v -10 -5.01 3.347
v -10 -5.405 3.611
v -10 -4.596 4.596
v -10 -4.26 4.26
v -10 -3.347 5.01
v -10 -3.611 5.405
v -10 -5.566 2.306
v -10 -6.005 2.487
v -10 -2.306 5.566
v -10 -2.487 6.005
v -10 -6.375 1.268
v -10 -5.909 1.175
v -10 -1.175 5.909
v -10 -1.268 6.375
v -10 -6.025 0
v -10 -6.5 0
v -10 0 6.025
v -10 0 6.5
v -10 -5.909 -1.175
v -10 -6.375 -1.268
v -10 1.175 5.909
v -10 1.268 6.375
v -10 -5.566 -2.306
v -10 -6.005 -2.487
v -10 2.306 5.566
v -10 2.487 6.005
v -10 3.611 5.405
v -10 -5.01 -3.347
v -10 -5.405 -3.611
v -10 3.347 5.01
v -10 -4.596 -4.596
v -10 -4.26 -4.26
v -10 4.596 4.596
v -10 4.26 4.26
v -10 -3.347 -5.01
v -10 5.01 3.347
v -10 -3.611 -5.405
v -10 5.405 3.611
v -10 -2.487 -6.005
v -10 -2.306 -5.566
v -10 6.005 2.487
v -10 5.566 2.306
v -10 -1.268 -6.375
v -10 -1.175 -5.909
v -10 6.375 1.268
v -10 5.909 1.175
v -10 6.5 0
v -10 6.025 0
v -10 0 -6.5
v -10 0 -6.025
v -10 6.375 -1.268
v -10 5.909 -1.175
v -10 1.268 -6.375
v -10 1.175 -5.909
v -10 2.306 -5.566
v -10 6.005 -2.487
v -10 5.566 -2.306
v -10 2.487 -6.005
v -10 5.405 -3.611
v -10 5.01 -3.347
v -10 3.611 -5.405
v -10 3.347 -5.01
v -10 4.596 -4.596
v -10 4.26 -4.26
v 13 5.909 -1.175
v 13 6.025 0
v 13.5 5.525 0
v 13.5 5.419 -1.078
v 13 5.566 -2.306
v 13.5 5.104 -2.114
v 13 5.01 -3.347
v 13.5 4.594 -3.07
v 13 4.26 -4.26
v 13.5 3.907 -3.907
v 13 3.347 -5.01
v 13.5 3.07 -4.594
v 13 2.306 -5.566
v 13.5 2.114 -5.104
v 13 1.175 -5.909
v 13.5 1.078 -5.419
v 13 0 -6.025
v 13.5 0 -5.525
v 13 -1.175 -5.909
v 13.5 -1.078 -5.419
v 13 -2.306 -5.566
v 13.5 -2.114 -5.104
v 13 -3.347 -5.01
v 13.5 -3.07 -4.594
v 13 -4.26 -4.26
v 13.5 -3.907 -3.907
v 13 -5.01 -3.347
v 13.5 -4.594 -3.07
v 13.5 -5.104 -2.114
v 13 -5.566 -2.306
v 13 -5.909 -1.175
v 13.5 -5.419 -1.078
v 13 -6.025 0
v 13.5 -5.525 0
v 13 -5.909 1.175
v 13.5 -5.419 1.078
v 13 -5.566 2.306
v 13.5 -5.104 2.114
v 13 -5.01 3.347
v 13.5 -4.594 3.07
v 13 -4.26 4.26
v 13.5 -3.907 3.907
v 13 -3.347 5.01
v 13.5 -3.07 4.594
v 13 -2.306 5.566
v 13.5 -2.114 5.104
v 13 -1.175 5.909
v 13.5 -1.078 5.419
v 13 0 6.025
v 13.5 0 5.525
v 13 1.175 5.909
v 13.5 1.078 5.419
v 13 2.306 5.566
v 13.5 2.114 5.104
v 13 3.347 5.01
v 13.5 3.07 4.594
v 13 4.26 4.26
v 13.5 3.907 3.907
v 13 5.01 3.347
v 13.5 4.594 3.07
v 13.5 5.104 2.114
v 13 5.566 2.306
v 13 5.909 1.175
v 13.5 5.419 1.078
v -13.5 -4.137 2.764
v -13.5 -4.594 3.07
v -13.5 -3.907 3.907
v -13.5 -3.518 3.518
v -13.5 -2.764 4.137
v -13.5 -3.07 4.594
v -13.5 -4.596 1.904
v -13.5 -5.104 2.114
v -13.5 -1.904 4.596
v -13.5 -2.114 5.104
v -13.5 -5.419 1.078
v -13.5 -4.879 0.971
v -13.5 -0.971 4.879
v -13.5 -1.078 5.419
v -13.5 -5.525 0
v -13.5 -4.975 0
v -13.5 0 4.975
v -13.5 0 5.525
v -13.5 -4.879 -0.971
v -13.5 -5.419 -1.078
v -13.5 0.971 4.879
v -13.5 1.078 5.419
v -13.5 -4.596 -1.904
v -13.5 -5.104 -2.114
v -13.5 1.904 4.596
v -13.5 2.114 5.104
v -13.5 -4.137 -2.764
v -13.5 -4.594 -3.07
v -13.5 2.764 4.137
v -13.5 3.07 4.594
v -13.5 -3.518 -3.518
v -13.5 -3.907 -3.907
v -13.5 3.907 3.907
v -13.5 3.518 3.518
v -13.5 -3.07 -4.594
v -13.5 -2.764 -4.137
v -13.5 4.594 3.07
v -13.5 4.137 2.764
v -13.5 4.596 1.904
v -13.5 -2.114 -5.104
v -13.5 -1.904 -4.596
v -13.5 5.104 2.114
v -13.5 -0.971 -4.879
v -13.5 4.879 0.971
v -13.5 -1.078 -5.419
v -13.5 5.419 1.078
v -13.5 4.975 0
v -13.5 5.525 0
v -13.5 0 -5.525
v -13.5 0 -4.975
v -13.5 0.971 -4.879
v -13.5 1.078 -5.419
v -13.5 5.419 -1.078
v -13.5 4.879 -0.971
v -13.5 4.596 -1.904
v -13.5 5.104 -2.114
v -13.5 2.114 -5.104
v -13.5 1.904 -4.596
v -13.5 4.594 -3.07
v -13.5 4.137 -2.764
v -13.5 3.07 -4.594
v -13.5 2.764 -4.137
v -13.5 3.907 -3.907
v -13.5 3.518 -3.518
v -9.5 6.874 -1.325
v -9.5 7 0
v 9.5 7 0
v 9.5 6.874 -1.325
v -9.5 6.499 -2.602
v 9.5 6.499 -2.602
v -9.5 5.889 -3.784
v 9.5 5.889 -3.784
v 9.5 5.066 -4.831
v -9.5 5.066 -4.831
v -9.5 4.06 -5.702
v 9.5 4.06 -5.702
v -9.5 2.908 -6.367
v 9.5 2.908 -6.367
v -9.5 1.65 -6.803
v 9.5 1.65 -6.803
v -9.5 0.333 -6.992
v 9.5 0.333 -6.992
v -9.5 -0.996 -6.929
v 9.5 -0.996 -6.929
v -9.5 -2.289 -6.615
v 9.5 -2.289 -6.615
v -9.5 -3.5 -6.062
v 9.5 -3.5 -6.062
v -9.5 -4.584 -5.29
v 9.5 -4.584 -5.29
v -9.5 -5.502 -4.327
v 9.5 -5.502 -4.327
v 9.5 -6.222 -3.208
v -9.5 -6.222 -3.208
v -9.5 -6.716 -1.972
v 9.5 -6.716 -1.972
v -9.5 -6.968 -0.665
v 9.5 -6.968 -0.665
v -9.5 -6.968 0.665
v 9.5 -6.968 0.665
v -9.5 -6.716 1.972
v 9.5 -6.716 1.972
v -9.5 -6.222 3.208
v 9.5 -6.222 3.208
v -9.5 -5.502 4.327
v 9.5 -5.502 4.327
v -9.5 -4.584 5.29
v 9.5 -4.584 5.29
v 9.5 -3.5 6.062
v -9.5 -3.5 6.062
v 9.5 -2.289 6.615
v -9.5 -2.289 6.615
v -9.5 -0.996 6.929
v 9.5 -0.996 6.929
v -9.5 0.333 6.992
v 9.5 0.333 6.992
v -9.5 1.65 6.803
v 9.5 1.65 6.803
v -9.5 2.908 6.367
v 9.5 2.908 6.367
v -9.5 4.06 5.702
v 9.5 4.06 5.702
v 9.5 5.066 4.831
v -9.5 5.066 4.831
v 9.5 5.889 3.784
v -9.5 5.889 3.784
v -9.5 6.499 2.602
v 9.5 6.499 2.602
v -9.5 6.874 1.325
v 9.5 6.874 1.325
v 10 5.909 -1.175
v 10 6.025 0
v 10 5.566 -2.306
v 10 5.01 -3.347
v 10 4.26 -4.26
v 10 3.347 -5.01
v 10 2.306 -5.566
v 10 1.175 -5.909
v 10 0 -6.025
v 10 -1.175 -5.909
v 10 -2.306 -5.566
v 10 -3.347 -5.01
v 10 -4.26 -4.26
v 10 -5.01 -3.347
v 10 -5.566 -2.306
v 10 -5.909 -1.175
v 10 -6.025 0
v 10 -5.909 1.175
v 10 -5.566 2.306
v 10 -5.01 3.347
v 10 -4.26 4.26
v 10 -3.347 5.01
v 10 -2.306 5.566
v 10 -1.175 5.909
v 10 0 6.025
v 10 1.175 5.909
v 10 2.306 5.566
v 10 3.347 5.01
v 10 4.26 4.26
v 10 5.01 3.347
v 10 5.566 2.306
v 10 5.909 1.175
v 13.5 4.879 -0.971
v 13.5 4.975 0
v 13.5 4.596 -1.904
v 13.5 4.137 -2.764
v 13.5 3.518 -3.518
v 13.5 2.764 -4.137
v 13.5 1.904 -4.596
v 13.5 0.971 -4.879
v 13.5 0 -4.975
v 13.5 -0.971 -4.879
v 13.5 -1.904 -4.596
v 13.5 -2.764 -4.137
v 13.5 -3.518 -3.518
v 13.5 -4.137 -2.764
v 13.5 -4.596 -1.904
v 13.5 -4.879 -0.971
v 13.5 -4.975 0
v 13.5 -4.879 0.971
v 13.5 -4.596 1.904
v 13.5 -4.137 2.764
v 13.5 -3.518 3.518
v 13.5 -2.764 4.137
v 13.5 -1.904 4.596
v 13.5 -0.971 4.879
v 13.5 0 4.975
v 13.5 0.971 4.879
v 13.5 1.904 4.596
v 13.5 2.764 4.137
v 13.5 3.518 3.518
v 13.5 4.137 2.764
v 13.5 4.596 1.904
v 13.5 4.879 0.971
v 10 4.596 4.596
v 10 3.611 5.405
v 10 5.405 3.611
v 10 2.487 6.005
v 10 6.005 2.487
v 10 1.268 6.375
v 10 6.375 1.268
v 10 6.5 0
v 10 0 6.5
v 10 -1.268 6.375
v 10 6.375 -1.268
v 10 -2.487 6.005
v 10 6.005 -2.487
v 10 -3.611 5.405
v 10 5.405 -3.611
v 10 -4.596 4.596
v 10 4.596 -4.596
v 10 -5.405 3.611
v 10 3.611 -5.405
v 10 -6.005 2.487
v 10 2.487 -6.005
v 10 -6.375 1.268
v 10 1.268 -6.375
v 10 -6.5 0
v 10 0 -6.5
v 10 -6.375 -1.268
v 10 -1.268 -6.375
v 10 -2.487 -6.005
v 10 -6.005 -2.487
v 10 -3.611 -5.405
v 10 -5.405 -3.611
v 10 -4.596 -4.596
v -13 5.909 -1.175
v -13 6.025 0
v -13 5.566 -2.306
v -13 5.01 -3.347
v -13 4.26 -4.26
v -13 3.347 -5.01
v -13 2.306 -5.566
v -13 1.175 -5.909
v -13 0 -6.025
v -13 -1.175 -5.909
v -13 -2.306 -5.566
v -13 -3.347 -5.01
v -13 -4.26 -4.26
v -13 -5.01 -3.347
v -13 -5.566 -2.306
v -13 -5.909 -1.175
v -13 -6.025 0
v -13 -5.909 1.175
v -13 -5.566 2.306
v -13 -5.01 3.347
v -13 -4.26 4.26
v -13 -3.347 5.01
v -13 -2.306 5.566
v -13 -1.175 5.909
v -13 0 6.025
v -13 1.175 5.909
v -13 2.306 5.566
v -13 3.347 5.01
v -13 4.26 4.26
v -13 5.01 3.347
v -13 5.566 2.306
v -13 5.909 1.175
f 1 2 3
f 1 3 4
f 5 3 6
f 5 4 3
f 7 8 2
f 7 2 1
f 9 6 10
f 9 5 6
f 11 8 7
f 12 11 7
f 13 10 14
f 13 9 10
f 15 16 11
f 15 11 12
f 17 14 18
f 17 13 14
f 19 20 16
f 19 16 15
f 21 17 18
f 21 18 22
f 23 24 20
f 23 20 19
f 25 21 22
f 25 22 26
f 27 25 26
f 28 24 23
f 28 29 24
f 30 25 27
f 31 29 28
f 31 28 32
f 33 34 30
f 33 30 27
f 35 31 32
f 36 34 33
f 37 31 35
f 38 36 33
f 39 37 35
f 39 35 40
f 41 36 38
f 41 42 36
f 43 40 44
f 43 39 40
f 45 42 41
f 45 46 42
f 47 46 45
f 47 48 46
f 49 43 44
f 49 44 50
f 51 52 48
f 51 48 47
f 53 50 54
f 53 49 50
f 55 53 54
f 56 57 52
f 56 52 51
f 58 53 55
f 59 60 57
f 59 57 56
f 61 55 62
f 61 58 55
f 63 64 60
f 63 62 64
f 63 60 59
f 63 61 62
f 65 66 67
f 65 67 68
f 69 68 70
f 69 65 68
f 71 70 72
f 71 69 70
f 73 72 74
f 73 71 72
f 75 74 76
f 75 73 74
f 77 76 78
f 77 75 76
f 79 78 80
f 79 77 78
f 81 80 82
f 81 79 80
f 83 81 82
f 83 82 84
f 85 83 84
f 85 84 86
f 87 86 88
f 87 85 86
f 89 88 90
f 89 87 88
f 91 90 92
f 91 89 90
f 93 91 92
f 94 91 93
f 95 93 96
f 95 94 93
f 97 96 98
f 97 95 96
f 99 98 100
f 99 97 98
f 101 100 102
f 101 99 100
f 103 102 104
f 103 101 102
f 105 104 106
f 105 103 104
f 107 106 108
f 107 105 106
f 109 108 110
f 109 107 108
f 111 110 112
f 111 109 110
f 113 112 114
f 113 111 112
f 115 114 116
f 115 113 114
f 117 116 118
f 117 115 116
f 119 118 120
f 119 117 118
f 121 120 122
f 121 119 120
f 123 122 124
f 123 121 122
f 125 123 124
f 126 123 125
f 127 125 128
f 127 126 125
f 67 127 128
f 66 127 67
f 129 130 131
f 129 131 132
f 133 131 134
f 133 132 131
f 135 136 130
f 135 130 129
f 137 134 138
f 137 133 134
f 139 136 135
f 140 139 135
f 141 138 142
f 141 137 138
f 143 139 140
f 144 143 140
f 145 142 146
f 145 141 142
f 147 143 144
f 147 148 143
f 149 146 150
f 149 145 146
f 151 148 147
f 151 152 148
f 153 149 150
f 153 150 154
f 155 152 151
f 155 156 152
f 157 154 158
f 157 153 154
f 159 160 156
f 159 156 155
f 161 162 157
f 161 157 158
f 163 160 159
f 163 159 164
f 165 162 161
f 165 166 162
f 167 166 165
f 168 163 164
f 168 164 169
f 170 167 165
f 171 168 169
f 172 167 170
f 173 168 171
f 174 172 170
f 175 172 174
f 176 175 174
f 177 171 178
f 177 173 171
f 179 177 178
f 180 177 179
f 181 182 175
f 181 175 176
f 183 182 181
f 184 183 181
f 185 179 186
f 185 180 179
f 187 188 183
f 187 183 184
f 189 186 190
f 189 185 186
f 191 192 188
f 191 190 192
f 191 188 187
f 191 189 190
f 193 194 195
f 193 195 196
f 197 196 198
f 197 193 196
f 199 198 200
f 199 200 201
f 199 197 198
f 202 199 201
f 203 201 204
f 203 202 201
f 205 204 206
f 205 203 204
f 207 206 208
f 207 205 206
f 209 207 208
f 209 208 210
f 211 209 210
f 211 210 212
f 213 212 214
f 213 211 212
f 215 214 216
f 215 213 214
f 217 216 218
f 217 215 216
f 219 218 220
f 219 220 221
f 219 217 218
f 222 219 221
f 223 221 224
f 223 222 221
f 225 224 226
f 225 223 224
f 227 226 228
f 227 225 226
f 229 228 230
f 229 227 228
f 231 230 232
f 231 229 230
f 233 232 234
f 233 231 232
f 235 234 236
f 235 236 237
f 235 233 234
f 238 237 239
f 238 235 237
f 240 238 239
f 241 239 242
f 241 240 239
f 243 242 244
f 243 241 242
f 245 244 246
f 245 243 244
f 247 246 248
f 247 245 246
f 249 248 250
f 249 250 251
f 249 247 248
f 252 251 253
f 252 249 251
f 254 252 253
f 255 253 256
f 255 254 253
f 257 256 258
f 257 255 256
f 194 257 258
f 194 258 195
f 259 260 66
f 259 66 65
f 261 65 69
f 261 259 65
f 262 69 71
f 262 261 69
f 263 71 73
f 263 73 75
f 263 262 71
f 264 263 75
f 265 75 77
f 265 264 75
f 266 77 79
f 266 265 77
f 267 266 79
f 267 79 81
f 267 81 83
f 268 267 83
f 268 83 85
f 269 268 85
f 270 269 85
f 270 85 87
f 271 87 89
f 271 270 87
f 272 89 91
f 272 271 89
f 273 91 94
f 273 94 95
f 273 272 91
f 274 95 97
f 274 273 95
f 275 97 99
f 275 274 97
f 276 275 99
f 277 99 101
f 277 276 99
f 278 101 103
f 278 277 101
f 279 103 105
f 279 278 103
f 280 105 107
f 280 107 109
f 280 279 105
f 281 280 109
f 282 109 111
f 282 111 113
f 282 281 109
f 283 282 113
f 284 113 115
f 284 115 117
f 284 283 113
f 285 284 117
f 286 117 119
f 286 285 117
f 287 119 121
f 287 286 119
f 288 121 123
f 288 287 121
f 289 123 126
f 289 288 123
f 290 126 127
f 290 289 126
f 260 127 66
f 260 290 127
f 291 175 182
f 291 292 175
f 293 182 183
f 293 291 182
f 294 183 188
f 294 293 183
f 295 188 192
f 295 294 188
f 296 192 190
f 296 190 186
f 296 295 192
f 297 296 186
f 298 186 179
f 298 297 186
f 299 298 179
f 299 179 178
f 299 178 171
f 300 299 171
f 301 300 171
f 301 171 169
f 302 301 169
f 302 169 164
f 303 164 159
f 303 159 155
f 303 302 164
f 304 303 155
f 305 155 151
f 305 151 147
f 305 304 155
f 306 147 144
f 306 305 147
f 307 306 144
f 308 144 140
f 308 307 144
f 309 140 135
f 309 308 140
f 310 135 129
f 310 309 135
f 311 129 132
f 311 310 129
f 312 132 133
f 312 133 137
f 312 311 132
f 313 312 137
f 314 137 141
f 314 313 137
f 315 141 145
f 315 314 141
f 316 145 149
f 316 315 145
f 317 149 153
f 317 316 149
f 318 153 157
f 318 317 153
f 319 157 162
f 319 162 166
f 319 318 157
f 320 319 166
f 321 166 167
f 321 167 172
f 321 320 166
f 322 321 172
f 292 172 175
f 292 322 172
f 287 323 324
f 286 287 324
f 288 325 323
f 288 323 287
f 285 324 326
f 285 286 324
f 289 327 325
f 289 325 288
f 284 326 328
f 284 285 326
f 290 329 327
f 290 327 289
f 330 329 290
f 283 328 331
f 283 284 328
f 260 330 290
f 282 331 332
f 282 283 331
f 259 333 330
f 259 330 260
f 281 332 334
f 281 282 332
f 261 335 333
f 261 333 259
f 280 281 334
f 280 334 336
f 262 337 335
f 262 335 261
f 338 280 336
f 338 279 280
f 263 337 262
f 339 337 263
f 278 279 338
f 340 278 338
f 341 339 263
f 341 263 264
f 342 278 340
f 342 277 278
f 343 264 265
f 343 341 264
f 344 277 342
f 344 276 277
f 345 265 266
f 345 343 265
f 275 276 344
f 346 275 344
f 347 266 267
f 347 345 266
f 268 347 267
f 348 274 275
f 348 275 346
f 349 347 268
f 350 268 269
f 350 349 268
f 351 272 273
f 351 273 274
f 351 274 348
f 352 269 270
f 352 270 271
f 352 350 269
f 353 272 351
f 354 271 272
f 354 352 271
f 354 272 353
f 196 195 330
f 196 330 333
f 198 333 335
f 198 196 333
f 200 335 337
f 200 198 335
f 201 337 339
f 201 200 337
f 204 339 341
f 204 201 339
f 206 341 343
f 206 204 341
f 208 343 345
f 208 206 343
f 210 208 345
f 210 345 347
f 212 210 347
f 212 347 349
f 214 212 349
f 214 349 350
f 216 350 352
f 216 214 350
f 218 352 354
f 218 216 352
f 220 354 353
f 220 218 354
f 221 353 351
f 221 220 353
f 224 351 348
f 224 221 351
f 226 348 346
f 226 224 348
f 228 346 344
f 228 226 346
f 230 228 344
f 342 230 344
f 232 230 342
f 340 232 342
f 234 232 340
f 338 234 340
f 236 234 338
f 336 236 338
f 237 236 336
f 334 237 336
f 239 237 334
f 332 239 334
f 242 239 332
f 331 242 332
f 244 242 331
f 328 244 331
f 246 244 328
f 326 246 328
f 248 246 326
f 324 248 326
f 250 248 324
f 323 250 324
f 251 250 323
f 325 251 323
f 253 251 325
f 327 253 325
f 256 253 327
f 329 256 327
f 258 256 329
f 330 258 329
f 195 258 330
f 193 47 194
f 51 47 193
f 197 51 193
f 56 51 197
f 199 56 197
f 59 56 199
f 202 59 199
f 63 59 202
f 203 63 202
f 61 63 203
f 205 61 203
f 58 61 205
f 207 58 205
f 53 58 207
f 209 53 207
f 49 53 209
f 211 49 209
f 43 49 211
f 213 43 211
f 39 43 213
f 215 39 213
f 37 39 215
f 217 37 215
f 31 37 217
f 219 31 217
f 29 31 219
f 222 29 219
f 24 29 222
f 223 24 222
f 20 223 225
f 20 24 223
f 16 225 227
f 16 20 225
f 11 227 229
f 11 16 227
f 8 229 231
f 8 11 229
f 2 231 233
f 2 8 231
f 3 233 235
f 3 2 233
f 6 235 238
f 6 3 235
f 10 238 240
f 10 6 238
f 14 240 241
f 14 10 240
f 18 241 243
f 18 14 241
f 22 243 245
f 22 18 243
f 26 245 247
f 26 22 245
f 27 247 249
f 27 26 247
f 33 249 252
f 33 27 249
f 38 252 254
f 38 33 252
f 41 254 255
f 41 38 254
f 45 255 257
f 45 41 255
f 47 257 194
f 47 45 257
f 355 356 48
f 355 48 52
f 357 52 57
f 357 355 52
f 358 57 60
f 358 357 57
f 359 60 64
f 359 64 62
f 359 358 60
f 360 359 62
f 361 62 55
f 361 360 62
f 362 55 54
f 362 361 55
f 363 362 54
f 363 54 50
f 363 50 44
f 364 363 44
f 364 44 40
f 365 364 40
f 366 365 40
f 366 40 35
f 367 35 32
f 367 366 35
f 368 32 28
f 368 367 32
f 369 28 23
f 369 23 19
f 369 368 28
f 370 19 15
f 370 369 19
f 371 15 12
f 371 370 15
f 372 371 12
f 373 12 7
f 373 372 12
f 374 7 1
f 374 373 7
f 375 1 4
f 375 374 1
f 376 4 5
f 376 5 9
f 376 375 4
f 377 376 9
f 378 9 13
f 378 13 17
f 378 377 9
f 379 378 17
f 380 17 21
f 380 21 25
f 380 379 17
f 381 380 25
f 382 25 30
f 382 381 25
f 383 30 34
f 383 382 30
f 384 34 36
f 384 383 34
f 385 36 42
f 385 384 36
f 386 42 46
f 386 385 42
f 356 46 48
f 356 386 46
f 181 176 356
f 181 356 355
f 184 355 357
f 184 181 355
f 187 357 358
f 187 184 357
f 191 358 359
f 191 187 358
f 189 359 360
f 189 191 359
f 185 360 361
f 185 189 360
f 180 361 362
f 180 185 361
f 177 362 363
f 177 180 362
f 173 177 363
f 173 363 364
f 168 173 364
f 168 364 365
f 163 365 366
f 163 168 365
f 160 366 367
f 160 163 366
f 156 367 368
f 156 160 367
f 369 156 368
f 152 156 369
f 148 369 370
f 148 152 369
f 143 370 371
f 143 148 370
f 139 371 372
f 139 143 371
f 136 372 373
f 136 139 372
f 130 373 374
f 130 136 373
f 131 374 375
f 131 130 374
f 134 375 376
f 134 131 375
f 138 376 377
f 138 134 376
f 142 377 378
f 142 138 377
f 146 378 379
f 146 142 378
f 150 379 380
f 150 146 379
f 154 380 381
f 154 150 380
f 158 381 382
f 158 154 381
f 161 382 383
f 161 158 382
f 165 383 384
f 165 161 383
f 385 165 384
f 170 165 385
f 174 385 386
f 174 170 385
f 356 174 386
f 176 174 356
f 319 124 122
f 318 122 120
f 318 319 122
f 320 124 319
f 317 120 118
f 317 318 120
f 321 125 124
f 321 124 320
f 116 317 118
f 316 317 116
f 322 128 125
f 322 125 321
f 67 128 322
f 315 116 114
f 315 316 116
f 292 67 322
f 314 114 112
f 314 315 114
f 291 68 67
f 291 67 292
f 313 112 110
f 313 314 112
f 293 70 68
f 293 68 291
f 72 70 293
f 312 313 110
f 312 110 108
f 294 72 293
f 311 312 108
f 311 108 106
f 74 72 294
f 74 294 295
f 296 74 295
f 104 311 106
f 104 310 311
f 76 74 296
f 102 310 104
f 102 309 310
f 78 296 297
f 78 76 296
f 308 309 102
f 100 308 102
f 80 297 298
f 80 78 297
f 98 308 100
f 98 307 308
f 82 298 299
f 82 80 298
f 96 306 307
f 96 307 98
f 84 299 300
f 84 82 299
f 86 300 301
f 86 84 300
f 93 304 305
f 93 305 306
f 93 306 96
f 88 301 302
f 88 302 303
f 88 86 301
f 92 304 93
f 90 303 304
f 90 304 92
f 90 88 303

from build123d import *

# Parameters (mm, degrees)
CHAMFER_1_SIZE = 0.5


with BuildPart() as part:
    # 草图1 → 旋转1 (revolve)
    with BuildSketch(Plane.XY):
        Polygon((-13.5, 4.975), (13.5, 4.975), (13.5, 6.025), (10, 6.025), (10, 7), (-10, 7), (-10, 6.025), (-13.5, 6.025), align=None)
    revolve(axis=Axis((13.5, 0, 0), (-1, 0, 0)))

    # 倒角1
    chamfer_1_edges = [part.edges().sort_by_distance(p)[0] for p in [
        (-13.5, -6.025, 0),
        (13.5, -6.025, 0),
        (10, -7, 0),
        (-10, -7, 0),
    ]]
    chamfer(chamfer_1_edges, length=CHAMFER_1_SIZE)


solid = part.part
